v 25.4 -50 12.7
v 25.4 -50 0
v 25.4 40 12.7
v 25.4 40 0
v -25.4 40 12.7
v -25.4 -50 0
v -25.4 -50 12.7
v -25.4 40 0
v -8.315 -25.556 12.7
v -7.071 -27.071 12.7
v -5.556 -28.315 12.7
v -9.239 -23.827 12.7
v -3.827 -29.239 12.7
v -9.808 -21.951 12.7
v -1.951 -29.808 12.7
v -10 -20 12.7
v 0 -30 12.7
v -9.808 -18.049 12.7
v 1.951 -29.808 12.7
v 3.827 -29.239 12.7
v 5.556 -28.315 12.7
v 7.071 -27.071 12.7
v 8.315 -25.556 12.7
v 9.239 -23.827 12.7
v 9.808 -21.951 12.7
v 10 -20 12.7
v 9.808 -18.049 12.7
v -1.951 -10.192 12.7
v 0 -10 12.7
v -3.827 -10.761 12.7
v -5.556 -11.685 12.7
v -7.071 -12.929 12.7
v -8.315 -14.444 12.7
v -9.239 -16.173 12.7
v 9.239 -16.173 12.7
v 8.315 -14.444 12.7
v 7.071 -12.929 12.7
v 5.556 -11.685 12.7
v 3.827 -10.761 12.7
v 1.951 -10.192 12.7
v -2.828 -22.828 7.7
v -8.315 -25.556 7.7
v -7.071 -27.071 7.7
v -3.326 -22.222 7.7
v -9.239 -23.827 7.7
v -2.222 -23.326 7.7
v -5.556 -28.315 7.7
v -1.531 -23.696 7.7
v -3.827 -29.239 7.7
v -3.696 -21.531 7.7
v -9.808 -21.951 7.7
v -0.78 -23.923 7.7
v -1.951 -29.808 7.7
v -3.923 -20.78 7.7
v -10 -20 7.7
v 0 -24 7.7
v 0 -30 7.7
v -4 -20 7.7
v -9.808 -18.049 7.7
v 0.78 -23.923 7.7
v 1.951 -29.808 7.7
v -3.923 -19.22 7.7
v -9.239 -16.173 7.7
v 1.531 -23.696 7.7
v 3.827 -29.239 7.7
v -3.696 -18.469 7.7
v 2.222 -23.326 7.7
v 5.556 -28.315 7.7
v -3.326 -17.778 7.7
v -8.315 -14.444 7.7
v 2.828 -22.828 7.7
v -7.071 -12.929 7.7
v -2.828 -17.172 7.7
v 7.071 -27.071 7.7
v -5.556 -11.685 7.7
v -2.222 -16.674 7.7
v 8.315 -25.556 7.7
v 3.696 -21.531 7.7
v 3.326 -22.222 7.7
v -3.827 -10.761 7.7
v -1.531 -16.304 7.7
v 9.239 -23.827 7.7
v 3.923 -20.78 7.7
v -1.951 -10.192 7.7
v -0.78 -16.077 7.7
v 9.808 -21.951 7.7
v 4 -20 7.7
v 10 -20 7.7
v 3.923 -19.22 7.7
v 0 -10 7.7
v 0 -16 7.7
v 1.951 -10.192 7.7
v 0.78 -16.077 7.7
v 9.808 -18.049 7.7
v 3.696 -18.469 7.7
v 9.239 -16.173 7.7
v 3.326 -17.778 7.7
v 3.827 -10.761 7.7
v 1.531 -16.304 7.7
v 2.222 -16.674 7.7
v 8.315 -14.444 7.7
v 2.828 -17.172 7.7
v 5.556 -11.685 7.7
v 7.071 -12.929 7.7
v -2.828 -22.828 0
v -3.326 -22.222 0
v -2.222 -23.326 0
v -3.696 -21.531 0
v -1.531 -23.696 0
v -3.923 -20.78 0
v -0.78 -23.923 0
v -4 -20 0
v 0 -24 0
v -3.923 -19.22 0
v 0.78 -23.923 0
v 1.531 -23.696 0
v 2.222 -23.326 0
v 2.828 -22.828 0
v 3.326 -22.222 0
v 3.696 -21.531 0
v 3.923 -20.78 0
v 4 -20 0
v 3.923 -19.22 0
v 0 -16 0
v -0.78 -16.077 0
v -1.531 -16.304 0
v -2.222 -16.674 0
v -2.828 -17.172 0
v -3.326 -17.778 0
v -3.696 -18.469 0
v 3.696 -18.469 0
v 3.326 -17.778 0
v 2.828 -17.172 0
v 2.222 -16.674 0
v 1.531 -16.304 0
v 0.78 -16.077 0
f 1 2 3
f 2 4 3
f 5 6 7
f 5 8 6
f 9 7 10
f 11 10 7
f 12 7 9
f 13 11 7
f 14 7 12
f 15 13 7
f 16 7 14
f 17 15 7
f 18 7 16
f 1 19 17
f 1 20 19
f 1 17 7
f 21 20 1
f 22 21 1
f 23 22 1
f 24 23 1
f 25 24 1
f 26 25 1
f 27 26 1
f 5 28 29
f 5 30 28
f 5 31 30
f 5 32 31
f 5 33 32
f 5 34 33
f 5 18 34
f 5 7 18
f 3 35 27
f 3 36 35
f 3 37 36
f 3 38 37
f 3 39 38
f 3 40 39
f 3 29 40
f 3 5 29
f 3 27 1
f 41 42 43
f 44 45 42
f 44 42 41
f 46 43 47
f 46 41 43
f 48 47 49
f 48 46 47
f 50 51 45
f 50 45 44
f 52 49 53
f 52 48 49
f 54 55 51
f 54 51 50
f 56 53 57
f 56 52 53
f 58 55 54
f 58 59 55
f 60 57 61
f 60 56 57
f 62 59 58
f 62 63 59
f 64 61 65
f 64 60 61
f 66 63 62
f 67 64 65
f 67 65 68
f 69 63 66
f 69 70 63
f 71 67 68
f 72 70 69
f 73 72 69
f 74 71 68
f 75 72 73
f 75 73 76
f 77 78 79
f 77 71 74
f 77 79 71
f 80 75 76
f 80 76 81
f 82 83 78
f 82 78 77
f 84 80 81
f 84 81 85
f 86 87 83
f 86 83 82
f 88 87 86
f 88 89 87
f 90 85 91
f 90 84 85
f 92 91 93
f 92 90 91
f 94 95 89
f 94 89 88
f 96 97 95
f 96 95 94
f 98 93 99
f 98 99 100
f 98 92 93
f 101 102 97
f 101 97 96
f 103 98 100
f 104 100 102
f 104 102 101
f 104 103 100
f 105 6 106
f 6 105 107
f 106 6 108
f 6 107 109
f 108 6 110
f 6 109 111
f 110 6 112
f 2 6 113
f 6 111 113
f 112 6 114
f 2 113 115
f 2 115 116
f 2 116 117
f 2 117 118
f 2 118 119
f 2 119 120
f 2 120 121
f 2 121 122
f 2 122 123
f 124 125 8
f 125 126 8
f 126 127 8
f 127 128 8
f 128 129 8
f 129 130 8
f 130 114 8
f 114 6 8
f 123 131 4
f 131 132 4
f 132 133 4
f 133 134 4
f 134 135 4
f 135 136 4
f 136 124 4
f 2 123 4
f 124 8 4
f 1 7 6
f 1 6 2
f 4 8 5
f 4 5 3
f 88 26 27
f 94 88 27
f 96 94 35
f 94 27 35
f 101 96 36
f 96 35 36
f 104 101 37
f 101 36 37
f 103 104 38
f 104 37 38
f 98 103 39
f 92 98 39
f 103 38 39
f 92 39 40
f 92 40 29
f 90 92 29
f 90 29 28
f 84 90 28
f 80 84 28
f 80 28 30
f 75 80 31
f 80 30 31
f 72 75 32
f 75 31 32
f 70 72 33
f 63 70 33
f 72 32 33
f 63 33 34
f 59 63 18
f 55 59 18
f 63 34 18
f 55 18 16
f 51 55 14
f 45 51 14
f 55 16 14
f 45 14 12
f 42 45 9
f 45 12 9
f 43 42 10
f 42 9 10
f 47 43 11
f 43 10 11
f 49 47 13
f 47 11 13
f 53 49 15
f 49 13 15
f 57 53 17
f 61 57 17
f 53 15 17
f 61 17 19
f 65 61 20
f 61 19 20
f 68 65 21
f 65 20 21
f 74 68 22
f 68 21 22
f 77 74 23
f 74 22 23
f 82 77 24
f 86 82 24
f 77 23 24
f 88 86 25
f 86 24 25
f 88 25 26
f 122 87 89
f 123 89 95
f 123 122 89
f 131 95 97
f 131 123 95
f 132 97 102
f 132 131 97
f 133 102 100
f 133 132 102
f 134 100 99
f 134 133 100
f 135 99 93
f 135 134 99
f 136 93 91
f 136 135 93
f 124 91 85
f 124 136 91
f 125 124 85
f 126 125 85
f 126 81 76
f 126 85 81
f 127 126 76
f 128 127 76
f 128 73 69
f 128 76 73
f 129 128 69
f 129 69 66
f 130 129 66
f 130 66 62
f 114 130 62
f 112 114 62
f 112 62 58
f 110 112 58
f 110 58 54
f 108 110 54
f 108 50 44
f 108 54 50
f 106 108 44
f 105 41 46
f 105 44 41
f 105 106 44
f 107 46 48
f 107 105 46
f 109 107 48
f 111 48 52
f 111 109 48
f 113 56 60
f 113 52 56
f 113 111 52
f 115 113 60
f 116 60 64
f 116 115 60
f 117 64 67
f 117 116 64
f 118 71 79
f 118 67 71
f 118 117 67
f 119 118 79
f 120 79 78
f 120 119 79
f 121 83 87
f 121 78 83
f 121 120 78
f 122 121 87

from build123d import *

# Parameters (mm, degrees)
CROQUIS1_W              = 50.8
CROQUIS1_H              = 80
CROQUIS1_R              = 4
SALIENTE_EXTRUIR1_DEPTH = 12.7
CROQUIS2_R              = 10
CORTAR_EXTRUIR1_DEPTH   = 5
CROQUIS3_W              = 50.8
CROQUIS3_H              = 12.7
SALIENTE_EXTRUIR2_DEPTH = 10


with BuildPart() as part:
    # Croquis1 → Saliente-Extruir1 (new body)
    with BuildSketch(Plane.XY):
        Rectangle(CROQUIS1_W, CROQUIS1_H)
        with Locations((0, -20)):
            Circle(CROQUIS1_R, mode=Mode.SUBTRACT)
    extrude(amount=SALIENTE_EXTRUIR1_DEPTH)

    # Croquis2 → Cortar-Extruir1 (cut)
    with BuildSketch(Plane.XY.offset(12.7)):
        with Locations((0, -20)):
            Circle(CROQUIS2_R)
    extrude(amount=-CORTAR_EXTRUIR1_DEPTH, mode=Mode.SUBTRACT)

    # Croquis3 → Saliente-Extruir2 (add)
    with BuildSketch(Plane.XZ.offset(40)):
        with Locations((0, 6.35)):
            Rectangle(CROQUIS3_W, CROQUIS3_H)
    extrude(amount=SALIENTE_EXTRUIR2_DEPTH)


solid = part.part
